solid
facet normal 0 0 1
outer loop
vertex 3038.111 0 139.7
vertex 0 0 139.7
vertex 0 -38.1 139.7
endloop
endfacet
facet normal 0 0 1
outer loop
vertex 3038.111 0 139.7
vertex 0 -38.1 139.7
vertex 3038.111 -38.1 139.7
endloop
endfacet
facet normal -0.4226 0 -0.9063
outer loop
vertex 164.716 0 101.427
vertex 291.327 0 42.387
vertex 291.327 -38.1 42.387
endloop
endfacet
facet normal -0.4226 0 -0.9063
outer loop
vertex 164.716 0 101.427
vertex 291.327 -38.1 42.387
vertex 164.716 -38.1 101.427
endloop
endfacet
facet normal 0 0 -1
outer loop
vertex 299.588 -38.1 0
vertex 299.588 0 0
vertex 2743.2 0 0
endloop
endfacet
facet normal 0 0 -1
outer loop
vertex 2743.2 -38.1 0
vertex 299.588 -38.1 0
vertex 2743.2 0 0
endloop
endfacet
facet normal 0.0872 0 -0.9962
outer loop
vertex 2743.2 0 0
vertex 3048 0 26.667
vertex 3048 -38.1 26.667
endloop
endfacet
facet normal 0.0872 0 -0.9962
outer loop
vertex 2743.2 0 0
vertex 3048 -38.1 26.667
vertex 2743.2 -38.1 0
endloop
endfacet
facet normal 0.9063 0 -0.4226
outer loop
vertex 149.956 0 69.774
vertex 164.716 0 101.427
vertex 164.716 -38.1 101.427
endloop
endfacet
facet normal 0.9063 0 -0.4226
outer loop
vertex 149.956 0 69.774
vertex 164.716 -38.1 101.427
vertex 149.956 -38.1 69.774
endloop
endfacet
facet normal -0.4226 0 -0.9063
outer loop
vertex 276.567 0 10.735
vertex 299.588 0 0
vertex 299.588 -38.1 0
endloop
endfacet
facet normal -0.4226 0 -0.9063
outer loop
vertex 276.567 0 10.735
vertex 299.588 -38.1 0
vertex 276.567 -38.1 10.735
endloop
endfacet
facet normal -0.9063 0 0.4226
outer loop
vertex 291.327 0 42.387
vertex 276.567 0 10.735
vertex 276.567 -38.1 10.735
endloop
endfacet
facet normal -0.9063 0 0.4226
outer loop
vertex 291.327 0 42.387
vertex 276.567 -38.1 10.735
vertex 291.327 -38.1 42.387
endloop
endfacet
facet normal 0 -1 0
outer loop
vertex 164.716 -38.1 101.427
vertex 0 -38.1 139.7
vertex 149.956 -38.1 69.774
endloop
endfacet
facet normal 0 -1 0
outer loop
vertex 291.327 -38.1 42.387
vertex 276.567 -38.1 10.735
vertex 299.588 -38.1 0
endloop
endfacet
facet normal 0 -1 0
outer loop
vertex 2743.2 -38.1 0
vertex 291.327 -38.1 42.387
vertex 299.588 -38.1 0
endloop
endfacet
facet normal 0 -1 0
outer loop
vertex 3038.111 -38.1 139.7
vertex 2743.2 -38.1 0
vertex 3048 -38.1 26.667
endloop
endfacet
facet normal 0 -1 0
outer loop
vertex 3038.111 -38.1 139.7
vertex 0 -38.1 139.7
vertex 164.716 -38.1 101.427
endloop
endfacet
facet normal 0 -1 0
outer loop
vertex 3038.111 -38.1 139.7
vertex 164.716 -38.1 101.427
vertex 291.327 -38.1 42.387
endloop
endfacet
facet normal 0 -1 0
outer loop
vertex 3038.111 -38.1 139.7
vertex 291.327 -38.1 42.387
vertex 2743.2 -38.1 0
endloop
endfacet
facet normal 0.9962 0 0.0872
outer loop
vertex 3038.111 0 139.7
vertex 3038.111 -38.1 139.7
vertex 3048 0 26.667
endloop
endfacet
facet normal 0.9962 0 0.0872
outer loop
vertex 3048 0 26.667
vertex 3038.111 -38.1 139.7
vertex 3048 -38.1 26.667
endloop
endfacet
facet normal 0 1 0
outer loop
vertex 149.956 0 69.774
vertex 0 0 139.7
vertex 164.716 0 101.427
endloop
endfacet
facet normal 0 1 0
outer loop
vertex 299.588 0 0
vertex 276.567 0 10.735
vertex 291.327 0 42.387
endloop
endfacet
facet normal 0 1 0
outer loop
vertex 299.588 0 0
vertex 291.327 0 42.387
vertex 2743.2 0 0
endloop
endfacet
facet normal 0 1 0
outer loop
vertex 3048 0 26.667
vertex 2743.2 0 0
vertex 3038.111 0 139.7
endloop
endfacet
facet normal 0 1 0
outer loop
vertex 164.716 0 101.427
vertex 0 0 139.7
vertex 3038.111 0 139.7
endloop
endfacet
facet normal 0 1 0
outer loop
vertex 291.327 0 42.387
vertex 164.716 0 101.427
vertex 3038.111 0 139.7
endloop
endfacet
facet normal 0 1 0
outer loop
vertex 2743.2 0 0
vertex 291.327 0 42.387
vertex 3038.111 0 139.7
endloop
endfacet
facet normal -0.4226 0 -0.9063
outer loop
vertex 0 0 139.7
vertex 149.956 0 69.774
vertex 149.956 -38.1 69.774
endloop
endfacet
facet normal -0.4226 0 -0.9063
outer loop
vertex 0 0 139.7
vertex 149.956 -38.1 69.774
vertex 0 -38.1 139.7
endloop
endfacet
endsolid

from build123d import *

# Parameters (mm, degrees)
F0_W     = 3048
F0_H     = 139.7
F1_DEPTH = 38.1
F3_DEPTH = 38.101
F5_DEPTH = 38.1


with BuildPart() as f1:
    # F0 (on Front) → F1 (new body)
    with BuildSketch(Plane.XZ):
        with Locations((1524, 69.85)):
            Rectangle(F0_W, F0_H)
    extrude(amount=F1_DEPTH)

    # F2 (on Front) → F3 (cut, through all)
    with BuildSketch(Plane.XZ):
        Polygon((149.956201, 69.774275), (0, 139.7), (0, 0), (299.587617, 0), (276.567399, 10.734504), (291.327342, 42.387303), (164.716144, 101.427074), align=None)
        Polygon((3048, 0), (3048, 26.666545), (2743.2, 0), align=None)
    extrude(amount=F3_DEPTH, mode=Mode.SUBTRACT)

    # F4 (on face) → F5 (cut)
    with BuildSketch(Plane.XZ.offset(38.1)):
        Polygon((3038.110854, 139.7), (3048, 26.666545), (3048, 139.7), align=None)
    extrude(amount=-F5_DEPTH, mode=Mode.SUBTRACT)


solid = f1.part
